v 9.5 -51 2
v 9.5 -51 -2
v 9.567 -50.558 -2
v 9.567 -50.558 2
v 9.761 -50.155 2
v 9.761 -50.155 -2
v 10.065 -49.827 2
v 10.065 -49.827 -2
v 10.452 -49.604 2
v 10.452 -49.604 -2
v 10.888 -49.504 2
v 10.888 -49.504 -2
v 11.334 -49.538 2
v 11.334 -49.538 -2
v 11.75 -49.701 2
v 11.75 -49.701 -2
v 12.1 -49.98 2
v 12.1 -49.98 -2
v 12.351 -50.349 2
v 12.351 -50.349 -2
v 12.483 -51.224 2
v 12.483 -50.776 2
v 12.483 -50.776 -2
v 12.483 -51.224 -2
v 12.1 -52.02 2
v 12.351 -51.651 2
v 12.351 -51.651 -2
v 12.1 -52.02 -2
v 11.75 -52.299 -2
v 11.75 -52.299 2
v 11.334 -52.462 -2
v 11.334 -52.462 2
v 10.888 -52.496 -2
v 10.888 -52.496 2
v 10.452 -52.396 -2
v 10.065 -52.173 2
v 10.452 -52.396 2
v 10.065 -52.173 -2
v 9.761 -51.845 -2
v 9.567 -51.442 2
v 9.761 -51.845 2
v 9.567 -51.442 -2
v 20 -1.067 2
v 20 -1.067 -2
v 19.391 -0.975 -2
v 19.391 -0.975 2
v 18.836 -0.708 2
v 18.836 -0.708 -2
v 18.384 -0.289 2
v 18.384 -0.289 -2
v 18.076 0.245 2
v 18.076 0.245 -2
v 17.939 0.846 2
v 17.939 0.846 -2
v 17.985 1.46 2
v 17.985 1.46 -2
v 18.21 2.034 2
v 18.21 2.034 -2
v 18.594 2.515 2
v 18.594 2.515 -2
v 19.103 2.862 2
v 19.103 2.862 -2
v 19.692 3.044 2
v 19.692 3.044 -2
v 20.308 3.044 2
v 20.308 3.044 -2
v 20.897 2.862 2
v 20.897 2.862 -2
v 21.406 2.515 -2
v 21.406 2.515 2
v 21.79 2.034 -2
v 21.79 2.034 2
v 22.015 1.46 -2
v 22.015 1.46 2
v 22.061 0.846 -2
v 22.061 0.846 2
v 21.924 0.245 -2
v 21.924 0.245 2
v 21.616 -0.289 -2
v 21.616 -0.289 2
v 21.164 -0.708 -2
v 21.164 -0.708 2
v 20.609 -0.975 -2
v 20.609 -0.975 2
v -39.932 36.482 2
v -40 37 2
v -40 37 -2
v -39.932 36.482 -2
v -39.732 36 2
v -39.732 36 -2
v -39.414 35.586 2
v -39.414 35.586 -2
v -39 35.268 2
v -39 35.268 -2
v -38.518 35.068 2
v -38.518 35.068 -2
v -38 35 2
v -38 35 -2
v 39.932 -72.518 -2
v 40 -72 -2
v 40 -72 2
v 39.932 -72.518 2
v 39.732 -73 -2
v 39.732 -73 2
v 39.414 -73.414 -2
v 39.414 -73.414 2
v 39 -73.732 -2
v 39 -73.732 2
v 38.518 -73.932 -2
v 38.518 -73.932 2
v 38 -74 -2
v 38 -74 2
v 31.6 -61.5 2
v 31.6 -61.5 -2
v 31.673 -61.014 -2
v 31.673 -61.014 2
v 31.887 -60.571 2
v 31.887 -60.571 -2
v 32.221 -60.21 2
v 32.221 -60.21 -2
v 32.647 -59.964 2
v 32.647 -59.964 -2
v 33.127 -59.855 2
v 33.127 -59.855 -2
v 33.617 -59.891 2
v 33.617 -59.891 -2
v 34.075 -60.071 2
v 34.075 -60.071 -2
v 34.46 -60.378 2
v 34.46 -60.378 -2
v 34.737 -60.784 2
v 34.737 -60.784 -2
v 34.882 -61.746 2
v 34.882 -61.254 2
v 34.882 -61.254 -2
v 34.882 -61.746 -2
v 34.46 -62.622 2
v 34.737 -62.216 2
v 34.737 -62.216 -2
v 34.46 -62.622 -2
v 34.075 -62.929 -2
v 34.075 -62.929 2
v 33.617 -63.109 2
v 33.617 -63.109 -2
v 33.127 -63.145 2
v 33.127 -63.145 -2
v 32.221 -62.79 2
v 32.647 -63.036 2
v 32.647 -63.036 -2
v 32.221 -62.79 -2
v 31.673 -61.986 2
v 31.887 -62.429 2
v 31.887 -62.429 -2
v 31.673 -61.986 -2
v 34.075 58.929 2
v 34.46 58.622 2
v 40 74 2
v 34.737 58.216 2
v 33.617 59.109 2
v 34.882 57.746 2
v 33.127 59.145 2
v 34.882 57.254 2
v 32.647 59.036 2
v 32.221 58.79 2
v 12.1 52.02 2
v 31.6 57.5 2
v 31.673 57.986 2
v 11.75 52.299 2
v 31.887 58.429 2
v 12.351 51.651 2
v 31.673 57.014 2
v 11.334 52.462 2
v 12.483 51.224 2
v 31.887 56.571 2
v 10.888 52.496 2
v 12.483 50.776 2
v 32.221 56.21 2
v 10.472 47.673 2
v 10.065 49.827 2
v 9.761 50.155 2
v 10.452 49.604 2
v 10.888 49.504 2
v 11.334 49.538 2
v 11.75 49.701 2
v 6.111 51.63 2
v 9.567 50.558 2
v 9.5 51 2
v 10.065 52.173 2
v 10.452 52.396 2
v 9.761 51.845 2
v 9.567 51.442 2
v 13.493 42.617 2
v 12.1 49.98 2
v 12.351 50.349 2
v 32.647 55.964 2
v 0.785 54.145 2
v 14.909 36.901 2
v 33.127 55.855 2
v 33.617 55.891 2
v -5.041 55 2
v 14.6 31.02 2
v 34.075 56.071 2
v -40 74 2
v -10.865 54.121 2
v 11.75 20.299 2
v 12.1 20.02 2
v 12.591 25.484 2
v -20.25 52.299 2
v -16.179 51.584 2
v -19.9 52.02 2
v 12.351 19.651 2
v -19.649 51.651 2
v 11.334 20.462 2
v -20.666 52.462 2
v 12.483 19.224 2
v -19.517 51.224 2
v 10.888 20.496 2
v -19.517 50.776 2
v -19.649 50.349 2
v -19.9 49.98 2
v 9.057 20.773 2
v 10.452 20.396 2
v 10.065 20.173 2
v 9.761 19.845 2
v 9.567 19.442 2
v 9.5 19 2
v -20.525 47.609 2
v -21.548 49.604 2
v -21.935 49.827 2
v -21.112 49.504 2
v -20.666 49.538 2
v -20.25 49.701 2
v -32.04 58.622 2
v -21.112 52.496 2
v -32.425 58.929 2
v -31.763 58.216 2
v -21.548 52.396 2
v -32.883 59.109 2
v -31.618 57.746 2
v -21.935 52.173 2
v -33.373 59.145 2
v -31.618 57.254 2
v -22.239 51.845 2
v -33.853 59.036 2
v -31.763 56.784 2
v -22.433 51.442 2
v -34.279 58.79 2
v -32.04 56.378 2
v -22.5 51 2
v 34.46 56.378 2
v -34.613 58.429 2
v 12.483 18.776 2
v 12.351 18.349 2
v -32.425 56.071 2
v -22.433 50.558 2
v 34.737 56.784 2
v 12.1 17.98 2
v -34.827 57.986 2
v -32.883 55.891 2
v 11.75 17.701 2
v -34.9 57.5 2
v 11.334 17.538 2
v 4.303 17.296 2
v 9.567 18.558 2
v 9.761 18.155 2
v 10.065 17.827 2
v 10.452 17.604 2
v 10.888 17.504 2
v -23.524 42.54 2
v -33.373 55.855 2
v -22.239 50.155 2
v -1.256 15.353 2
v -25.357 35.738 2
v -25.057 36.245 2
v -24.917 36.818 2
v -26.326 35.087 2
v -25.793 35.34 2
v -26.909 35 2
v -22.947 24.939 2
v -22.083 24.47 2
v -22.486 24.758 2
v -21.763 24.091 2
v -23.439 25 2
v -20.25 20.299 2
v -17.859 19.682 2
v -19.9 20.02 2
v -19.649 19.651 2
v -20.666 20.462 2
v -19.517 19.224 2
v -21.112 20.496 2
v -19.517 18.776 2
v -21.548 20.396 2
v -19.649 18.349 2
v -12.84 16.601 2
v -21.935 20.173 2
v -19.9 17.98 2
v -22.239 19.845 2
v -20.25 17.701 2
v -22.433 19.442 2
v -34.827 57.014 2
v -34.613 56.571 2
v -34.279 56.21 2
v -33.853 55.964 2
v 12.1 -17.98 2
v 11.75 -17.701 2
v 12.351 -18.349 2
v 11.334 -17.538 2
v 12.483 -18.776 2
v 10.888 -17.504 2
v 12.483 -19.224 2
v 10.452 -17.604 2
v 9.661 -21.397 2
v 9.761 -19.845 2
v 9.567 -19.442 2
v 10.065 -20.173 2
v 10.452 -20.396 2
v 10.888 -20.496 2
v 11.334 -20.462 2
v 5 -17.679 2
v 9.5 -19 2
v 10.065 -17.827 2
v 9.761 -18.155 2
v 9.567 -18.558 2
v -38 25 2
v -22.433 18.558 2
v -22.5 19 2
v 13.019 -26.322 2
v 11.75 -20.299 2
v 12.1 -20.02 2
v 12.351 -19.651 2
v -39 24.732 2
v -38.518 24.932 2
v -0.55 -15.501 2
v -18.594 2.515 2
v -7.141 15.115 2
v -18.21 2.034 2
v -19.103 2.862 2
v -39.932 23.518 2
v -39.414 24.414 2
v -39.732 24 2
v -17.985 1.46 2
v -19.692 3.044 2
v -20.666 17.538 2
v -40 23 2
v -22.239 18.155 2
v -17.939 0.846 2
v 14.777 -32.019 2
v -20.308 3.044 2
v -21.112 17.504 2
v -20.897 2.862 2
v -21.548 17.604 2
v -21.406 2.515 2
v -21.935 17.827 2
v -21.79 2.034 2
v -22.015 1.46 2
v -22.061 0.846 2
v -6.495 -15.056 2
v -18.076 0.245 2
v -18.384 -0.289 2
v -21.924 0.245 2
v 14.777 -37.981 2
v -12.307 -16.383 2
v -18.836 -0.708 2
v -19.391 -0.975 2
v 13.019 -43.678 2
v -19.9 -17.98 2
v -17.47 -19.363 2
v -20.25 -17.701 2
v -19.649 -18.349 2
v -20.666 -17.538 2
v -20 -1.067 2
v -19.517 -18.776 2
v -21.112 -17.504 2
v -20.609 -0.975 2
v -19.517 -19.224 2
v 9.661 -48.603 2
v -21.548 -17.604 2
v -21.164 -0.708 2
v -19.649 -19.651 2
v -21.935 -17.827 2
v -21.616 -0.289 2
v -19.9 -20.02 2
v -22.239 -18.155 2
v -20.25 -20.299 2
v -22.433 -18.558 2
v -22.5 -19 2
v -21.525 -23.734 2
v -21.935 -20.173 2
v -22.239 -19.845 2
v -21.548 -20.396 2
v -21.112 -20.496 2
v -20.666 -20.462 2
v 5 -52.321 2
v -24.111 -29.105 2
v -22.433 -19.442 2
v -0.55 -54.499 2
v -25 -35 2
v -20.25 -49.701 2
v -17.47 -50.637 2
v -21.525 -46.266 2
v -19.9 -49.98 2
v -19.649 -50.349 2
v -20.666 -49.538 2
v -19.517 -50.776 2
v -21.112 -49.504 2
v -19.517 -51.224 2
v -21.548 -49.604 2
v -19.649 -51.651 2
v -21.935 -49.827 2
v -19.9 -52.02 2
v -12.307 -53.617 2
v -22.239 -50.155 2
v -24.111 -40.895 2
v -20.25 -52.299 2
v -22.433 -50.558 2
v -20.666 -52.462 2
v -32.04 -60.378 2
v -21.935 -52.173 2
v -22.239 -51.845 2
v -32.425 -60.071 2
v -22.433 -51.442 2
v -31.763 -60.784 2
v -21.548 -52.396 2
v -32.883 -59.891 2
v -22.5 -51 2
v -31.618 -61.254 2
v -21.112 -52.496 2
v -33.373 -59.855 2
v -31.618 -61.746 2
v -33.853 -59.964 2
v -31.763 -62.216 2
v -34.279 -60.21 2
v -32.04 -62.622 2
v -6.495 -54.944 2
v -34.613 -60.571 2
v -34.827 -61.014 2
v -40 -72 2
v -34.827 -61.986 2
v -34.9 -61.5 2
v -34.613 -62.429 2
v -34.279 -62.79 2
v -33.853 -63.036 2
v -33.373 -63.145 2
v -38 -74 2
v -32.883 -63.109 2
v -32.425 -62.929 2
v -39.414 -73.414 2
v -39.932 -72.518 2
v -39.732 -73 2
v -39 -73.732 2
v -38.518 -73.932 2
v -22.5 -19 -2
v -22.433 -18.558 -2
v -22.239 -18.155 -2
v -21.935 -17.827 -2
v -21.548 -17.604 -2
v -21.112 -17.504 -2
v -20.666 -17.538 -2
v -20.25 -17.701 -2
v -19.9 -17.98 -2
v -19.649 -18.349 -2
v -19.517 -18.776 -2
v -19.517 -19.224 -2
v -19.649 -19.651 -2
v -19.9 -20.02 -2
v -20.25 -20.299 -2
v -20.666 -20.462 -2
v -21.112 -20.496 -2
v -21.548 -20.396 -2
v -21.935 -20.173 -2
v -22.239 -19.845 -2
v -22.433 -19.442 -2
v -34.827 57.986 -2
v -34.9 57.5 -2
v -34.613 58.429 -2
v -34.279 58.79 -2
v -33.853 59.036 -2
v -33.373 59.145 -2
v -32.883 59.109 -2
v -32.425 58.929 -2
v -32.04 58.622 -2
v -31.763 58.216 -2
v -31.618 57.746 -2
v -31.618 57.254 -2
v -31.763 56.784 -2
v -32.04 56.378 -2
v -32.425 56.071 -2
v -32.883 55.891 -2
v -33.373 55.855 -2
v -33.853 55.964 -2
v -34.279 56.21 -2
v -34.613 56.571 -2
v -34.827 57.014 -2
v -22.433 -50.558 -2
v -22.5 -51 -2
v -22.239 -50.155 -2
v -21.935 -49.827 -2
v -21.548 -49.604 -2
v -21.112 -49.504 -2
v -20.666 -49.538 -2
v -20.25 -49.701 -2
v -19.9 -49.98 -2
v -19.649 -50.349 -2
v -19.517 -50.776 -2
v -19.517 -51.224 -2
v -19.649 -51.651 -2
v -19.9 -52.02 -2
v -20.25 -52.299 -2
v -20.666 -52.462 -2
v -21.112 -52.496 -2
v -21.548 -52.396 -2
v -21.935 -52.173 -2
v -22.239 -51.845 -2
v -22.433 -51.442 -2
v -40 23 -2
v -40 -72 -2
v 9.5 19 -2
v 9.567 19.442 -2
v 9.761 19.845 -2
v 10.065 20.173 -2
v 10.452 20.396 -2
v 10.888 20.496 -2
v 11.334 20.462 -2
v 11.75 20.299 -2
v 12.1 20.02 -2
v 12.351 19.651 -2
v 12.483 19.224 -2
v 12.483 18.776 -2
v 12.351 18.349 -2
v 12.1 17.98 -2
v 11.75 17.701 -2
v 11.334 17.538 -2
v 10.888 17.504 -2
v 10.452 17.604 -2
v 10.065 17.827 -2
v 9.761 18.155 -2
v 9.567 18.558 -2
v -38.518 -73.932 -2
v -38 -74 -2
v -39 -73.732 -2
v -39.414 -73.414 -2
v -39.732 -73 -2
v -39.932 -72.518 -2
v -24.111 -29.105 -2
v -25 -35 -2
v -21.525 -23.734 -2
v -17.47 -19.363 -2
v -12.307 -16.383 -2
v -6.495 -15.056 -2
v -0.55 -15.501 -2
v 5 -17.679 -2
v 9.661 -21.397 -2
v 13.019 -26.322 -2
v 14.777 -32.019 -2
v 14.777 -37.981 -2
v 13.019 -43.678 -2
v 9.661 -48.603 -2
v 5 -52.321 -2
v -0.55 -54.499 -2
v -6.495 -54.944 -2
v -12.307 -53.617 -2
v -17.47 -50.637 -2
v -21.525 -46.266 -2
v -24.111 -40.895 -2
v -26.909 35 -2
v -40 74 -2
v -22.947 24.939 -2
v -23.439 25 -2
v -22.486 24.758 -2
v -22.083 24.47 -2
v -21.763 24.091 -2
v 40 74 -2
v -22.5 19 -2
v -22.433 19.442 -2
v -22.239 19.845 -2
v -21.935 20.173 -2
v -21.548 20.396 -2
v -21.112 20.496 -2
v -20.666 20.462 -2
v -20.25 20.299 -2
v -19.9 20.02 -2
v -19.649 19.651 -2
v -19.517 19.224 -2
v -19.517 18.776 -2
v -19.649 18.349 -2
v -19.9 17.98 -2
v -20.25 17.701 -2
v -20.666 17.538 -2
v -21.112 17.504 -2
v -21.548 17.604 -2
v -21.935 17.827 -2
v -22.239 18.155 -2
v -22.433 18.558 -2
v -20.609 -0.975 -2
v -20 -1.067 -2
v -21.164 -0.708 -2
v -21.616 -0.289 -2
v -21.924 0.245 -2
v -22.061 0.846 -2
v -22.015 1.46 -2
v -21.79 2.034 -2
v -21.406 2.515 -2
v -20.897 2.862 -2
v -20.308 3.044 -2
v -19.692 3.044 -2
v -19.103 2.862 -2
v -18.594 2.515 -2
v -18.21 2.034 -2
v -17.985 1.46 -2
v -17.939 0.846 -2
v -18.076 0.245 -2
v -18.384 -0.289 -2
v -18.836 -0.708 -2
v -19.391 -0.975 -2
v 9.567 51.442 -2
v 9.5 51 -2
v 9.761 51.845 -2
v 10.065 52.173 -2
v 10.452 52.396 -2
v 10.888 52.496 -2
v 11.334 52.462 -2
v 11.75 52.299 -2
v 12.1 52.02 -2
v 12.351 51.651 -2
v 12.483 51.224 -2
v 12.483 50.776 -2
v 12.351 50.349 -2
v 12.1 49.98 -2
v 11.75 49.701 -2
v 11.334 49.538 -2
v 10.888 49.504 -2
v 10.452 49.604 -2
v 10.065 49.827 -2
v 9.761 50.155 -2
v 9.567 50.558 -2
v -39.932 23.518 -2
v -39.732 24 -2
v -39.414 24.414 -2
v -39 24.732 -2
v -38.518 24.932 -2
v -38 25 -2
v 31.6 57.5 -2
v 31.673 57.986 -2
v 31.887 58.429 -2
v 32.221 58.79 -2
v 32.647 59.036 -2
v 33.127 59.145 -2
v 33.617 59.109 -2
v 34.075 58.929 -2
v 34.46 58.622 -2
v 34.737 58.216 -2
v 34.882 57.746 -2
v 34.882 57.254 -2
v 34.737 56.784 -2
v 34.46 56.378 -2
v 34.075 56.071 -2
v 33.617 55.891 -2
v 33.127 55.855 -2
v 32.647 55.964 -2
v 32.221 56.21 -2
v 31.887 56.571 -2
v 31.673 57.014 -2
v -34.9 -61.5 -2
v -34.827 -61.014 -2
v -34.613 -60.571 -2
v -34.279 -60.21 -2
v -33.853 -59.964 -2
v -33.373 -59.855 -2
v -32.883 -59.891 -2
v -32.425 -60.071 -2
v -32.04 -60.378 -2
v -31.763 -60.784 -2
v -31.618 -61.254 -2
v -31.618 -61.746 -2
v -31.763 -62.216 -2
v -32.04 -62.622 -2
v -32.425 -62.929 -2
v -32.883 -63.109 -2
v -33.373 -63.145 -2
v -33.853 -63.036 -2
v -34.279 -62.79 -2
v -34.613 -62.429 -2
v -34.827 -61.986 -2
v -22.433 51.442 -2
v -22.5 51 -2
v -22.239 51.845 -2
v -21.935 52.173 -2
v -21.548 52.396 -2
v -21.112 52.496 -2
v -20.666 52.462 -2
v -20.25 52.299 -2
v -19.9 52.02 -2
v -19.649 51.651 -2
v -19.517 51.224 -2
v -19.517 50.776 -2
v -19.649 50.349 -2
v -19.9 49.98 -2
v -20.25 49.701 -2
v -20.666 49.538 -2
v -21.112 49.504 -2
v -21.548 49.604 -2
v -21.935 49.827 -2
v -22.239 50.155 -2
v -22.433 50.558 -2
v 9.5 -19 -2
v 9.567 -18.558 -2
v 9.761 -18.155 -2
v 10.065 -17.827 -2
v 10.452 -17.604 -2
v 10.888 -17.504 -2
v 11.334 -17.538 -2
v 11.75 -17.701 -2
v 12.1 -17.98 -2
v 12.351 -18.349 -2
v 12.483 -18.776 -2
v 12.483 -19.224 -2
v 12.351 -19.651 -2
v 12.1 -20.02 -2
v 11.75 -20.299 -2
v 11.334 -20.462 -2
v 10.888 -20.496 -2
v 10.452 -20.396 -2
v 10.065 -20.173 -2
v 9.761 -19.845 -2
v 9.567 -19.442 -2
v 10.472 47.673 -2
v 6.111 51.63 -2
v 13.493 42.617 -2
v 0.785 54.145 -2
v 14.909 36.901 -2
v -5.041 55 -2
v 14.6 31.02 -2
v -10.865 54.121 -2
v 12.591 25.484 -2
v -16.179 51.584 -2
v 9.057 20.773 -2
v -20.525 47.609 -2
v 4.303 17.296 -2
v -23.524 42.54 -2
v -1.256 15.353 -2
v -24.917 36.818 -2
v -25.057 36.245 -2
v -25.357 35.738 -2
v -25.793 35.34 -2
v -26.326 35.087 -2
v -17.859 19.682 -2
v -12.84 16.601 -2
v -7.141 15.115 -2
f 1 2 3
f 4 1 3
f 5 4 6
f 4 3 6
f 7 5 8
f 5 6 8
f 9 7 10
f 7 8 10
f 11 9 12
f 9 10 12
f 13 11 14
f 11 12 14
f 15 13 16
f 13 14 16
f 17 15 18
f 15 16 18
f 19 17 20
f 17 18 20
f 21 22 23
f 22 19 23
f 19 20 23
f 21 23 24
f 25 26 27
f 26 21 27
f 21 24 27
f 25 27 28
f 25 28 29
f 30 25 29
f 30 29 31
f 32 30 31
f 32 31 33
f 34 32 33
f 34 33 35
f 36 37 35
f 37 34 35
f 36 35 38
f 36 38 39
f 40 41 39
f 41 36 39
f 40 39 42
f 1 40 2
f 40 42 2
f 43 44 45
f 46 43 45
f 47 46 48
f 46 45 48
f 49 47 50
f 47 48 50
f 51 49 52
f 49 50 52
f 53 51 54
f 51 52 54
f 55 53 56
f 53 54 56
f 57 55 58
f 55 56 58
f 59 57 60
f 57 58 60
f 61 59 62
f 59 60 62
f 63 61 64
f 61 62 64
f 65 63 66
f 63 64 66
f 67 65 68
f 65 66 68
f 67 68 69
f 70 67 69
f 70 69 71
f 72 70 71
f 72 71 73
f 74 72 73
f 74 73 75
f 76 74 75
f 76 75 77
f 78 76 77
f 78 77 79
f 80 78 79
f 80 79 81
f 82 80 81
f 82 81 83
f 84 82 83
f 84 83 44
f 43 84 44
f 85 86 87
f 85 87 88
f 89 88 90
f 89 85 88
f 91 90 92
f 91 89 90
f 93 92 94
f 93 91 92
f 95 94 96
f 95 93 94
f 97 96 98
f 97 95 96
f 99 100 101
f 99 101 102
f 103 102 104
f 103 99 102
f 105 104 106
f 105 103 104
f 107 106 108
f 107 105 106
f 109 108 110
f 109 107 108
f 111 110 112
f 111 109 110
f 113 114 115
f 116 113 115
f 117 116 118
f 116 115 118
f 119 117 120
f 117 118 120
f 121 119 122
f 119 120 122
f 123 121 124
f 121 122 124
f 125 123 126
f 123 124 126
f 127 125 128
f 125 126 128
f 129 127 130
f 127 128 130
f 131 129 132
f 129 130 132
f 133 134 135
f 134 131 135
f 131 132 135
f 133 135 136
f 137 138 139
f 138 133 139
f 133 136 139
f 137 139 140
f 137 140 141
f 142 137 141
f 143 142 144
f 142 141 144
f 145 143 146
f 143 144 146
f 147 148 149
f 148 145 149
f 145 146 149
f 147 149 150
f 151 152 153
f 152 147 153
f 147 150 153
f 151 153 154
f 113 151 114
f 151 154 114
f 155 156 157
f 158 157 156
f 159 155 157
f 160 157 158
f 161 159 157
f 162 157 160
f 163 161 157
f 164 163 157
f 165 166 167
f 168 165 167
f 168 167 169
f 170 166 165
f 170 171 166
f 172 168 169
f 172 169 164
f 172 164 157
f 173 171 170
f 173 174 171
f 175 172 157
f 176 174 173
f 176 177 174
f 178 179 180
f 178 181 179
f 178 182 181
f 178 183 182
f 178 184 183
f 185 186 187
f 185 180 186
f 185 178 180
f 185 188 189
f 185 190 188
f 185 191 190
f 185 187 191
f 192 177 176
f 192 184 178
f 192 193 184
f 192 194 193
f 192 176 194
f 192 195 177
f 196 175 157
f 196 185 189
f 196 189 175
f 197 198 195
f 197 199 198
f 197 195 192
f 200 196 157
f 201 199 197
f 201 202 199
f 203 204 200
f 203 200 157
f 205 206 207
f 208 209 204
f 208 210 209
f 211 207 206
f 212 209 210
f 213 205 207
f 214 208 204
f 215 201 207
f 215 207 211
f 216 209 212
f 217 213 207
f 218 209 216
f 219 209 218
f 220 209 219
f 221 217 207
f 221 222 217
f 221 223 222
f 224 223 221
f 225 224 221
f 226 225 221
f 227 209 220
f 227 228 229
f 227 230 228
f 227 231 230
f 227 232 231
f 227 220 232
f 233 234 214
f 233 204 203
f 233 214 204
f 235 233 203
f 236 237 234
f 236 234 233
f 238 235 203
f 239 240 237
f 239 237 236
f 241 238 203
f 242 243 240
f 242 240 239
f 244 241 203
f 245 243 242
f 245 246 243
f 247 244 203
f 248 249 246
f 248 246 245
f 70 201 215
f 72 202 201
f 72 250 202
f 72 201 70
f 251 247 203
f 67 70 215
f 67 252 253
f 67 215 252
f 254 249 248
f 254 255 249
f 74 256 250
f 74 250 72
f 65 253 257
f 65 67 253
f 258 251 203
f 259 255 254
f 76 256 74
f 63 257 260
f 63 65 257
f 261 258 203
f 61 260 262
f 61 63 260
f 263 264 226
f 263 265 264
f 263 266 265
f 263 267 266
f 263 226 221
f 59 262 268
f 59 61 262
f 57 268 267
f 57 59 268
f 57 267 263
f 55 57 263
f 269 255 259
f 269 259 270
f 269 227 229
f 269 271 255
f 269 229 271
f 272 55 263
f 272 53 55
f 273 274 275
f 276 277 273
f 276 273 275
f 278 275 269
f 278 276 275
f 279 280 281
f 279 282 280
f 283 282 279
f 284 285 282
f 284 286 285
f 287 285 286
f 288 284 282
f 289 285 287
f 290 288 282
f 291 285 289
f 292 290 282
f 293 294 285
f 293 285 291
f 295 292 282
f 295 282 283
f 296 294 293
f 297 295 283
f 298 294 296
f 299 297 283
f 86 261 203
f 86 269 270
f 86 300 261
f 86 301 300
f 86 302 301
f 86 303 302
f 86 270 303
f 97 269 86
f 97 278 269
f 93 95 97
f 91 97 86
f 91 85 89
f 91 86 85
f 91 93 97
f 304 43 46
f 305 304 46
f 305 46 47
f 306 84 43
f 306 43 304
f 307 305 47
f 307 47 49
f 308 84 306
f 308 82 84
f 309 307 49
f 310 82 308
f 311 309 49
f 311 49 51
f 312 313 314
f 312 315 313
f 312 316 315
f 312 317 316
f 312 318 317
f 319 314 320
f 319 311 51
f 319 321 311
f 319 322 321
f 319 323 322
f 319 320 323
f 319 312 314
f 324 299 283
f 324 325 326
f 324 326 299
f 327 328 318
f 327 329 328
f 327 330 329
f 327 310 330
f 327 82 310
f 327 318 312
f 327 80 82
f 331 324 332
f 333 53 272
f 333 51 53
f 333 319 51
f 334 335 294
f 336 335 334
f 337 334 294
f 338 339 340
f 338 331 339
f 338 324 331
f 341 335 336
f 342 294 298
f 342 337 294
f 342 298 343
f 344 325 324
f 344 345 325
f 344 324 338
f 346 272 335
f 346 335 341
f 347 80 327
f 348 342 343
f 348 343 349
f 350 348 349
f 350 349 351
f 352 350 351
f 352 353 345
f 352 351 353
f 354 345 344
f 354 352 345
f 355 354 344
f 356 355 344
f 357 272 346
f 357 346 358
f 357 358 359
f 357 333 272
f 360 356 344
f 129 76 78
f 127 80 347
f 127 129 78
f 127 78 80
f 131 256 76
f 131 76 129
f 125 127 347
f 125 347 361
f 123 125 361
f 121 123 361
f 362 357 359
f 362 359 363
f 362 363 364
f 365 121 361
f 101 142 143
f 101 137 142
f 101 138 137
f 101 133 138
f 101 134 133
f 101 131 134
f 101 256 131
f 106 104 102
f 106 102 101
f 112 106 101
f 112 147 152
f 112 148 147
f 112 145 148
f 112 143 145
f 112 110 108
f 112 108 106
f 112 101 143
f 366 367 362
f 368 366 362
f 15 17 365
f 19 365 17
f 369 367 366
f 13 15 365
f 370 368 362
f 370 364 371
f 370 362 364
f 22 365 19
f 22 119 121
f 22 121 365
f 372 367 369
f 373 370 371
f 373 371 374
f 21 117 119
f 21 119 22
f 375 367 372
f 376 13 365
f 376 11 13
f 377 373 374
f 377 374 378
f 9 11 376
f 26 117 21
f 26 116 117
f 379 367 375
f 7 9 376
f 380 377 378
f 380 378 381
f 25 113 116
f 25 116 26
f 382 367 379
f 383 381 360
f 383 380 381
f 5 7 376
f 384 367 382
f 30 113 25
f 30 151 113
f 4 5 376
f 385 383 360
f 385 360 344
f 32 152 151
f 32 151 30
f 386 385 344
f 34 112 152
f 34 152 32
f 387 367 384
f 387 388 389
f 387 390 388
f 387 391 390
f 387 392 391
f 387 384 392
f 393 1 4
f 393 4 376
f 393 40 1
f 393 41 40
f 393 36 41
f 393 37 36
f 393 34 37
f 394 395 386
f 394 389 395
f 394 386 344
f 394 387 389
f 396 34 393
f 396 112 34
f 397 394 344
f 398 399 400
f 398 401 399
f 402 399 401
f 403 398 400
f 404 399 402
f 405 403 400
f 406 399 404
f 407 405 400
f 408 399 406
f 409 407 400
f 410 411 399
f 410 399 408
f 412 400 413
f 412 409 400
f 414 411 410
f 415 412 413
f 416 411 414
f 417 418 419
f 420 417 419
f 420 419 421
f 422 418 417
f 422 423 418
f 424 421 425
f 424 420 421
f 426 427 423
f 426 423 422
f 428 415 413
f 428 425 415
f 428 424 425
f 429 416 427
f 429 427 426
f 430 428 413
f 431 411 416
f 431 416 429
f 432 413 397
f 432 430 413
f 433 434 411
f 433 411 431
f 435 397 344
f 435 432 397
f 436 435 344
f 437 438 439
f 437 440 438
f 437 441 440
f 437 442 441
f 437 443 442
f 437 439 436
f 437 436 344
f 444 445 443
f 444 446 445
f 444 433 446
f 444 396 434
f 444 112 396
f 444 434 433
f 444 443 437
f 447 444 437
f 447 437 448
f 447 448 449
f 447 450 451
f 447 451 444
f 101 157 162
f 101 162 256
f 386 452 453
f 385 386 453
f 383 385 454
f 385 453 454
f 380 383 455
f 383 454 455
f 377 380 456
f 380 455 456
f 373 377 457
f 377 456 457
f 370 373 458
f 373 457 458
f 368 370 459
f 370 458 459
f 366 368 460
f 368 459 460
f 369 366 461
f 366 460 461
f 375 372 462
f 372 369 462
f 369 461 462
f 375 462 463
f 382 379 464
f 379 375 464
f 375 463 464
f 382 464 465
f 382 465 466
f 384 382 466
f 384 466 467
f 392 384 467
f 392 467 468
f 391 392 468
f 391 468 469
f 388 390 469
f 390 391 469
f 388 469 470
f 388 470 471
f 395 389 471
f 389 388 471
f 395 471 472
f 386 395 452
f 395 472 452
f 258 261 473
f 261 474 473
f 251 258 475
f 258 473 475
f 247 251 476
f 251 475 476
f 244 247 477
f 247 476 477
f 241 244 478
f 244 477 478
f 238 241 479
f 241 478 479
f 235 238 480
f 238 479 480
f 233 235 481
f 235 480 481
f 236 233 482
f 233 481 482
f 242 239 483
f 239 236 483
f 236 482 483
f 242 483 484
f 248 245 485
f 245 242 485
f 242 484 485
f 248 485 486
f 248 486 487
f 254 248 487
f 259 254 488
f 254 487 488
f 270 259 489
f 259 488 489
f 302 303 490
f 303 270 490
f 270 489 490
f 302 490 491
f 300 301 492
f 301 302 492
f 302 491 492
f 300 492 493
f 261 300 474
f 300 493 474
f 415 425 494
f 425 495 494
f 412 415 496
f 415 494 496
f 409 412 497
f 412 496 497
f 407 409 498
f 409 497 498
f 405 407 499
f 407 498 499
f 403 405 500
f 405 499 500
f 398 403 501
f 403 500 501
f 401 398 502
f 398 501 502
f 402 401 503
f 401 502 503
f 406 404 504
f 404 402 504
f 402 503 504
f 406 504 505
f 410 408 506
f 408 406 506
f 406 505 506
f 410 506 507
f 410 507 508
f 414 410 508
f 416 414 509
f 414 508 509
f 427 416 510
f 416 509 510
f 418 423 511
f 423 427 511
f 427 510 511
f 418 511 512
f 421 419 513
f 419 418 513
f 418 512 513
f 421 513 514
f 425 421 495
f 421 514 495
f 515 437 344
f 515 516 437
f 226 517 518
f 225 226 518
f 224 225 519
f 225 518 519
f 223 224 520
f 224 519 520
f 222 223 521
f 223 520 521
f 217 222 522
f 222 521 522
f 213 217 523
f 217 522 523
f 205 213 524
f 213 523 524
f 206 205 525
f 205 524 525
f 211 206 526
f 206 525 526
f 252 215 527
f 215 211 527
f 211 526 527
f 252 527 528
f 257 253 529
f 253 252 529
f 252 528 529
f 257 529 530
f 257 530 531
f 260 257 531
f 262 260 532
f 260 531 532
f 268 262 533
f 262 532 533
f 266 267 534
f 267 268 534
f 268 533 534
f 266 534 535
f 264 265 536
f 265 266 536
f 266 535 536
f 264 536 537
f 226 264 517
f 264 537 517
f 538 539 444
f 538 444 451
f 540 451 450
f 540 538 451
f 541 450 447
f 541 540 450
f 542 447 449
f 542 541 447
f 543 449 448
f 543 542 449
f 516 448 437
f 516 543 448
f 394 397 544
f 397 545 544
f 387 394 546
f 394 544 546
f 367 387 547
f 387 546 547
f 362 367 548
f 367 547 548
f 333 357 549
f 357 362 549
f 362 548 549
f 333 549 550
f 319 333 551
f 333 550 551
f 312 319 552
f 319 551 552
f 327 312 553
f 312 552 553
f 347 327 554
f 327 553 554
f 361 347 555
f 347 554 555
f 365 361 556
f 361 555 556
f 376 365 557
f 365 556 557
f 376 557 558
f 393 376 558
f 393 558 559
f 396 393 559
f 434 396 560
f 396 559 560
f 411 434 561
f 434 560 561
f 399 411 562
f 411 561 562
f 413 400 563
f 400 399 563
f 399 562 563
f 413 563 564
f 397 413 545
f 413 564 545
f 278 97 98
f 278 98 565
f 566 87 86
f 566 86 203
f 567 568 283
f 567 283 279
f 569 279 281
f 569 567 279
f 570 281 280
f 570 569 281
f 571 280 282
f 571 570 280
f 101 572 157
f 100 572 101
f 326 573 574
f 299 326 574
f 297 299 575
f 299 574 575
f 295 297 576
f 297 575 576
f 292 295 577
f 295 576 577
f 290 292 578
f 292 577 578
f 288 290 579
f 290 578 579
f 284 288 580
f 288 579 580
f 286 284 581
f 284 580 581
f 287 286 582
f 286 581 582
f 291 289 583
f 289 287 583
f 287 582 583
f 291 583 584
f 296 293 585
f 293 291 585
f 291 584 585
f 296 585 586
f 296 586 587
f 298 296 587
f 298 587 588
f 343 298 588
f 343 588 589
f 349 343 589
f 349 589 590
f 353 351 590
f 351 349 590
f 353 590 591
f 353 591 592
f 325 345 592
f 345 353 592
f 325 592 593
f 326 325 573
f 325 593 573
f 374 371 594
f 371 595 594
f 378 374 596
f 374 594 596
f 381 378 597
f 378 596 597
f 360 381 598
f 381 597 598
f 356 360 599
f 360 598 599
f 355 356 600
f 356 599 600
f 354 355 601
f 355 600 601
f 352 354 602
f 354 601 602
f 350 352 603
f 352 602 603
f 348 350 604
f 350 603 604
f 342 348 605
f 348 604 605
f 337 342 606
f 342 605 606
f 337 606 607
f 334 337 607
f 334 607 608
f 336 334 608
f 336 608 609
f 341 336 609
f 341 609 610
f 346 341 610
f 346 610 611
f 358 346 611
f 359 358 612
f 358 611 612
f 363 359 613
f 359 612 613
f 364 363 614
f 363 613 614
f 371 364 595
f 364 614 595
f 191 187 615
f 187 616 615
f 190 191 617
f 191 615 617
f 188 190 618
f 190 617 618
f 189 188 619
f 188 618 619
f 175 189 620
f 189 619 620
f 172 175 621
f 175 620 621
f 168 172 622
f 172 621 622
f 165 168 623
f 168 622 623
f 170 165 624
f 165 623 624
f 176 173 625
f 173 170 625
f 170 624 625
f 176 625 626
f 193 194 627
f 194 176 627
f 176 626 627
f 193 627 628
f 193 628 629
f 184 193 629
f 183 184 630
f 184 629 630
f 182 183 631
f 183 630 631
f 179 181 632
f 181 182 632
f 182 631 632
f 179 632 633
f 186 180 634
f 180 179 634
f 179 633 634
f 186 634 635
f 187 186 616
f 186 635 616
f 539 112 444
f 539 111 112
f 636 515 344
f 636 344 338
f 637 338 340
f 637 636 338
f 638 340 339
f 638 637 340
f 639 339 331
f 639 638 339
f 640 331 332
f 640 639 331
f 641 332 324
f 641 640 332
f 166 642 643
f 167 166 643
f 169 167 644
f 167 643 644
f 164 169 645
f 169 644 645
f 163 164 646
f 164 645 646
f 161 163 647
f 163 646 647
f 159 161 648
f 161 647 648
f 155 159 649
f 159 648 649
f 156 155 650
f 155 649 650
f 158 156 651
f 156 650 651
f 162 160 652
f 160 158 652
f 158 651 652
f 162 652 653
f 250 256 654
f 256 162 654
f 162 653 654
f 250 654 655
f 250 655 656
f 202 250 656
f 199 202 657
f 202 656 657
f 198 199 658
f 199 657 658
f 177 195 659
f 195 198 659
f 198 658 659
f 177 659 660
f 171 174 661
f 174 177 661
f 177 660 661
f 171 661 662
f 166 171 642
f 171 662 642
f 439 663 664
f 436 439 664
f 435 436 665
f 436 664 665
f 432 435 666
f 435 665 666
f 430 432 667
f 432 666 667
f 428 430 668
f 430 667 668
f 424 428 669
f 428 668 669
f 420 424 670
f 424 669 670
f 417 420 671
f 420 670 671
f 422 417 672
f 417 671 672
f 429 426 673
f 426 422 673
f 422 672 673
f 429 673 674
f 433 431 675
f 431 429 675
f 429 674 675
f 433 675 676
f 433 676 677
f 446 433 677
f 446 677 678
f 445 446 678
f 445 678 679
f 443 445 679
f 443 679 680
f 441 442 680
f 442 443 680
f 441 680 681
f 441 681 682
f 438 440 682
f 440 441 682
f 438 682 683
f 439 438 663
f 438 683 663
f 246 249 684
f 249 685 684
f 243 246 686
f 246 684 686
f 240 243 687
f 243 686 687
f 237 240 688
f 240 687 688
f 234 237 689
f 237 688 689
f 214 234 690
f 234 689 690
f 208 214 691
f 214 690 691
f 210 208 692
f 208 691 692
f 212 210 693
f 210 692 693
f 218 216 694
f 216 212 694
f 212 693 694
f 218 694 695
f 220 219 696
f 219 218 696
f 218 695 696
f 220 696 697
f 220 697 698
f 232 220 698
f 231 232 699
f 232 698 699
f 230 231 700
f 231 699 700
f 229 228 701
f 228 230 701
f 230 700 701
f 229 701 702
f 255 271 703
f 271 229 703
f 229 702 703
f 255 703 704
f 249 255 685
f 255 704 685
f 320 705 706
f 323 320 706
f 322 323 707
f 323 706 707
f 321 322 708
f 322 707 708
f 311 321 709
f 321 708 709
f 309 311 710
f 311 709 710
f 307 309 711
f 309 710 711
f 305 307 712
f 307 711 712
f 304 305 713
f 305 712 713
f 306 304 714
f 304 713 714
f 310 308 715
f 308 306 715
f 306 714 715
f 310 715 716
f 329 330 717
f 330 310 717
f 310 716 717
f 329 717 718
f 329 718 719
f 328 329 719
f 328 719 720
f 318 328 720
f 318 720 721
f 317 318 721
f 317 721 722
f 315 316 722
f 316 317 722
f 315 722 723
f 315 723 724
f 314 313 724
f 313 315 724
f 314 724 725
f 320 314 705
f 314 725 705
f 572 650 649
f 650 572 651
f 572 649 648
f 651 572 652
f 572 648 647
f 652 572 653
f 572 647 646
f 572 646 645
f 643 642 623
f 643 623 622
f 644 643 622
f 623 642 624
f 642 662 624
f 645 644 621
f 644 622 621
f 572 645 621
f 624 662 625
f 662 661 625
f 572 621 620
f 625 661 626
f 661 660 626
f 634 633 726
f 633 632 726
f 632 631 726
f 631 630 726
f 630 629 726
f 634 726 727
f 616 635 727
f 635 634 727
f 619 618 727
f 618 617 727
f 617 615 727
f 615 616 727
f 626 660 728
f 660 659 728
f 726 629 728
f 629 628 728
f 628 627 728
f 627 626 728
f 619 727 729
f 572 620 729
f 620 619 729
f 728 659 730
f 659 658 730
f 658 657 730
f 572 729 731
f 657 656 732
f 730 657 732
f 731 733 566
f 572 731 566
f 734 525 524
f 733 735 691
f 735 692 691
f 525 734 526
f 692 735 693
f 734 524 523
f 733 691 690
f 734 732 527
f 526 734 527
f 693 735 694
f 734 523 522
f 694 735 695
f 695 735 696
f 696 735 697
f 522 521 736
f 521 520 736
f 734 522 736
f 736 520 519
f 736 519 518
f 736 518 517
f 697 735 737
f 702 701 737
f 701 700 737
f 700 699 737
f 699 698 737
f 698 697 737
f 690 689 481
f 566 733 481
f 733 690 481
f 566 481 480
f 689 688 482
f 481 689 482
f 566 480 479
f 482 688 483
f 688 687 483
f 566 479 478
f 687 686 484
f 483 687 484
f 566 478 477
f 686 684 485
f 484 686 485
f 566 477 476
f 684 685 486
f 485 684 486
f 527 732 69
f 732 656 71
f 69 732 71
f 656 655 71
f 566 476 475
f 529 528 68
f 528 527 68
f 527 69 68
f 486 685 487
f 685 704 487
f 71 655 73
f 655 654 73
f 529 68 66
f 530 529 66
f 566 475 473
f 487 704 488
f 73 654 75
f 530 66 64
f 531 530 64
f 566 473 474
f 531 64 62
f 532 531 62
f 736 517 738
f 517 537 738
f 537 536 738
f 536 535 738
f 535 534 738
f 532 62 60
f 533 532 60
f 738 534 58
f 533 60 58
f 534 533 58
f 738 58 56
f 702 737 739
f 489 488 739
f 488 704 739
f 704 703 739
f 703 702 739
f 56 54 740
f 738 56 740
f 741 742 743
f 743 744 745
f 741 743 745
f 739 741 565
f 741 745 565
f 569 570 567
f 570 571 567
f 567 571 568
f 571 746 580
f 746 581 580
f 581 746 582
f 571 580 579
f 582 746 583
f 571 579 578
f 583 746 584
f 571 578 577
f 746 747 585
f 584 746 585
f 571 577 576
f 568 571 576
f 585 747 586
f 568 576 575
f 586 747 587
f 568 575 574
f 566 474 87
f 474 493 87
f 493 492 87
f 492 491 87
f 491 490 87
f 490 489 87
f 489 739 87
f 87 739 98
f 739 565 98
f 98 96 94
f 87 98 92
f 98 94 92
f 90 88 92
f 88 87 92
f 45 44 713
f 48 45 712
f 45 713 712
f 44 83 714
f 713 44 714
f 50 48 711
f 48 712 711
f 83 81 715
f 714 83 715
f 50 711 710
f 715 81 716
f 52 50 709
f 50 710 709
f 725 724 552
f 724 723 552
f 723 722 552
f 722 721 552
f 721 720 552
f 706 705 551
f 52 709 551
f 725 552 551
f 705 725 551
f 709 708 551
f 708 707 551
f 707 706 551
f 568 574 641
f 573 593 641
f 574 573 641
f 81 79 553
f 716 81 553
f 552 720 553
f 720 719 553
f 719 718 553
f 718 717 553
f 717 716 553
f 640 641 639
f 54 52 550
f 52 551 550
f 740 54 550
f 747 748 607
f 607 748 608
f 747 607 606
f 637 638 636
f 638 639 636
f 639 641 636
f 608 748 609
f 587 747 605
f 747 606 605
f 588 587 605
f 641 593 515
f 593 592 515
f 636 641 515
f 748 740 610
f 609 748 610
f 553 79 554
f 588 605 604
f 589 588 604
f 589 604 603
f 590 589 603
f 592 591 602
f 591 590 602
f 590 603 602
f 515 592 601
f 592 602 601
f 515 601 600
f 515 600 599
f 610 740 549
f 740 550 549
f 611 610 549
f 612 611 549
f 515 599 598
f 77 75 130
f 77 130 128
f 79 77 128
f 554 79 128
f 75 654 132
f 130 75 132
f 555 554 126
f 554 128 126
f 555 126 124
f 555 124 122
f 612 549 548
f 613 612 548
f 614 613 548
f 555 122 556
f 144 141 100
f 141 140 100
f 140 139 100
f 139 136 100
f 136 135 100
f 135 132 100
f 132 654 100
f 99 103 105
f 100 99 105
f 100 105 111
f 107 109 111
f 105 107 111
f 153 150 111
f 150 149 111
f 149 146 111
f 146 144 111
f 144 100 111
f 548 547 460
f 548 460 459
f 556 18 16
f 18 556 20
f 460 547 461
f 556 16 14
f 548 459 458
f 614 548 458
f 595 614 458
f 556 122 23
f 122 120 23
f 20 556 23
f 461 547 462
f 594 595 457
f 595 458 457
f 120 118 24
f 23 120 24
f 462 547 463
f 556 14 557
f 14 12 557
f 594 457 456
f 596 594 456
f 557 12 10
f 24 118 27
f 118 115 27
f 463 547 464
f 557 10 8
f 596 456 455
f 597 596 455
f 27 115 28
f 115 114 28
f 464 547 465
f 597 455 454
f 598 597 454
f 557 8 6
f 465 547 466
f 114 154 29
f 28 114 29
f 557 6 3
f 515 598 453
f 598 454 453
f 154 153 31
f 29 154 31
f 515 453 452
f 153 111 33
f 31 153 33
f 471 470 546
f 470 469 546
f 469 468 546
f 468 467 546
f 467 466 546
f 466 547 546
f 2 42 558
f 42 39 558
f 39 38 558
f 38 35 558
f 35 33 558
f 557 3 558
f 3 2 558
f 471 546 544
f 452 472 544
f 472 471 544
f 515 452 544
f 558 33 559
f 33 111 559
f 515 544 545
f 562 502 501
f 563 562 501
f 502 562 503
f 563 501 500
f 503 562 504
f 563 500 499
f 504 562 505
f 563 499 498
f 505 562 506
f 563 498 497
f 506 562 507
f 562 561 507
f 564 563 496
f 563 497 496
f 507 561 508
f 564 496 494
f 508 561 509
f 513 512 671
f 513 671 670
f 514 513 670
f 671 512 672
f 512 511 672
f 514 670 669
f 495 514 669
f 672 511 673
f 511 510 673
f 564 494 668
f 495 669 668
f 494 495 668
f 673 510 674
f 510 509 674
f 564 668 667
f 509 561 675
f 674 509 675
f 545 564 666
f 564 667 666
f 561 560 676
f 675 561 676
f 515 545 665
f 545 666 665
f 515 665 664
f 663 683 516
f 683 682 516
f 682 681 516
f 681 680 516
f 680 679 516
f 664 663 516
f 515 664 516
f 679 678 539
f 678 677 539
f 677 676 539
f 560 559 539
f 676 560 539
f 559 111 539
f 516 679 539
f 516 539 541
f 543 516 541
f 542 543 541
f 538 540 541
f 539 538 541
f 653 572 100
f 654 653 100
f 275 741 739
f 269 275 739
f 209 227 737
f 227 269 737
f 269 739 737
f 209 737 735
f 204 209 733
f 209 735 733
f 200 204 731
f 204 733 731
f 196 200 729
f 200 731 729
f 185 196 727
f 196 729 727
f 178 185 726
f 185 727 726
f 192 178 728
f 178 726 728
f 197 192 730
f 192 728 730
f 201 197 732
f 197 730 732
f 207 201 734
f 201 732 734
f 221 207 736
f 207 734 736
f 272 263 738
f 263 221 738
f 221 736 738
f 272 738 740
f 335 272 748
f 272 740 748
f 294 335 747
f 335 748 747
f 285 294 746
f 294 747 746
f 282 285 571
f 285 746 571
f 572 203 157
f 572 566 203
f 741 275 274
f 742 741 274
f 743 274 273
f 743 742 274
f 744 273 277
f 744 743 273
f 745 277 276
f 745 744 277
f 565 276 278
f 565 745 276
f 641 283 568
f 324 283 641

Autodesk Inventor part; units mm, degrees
ref_plane "YZ Plane" through (0, 0, 0) normal (1, 0, 0) x (0, 1, 0)
ref_plane "XZ Plane" through (0, 0, 0) normal (0, 1, 0) x (-1, 0, 0)
ref_plane "XY Plane" through (0, 0, 0) normal (0, 0, 1) x (1, 0, 0)
sketch "Sketch1" plane through (0, 0, 0) normal (0, 0, 1) x (-1, 0, 0)
  line L0 (-38, 74) -> (38, 74)
  line L1 (40, 72) -> (40, -74)
  line L2 (40, -74) -> (-40, -74)
  line L3 (-40, -74) -> (-40, 72)
  circle A0 centre (-33.25, 61.5) radius 1.65
  circle A1 centre (33.25, 61.5) radius 1.65
  circle A2 centre (33.25, -57.5) radius 1.65
  circle A3 centre (-33.25, -57.5) radius 1.65
  line L4 (-33.25, 61.5) -> (33.25, 61.5) construction
  line L5 (33.25, 61.5) -> (33.25, -57.5) construction
  circle A4 centre (5, 35) radius 20
  circle A5 centre (5, -35) radius 20
  line L6 (5, 35) -> (5, -35) construction
  line L7 (-11, -51) -> (21, -51) construction
  line L8 (21, -51) -> (21, -19) construction
  line L9 (-11, 51) -> (21, 51) construction
  line L10 (21, 51) -> (21, 19) construction
  circle A6 centre (-11, 51) radius 1.5
  circle A7 centre (21, 51) radius 1.5
  circle A8 centre (21, 19) radius 1.5
  circle A9 centre (-11, 19) radius 1.5
  circle A10 centre (21, -19) radius 1.5
  circle A11 centre (21, -51) radius 1.5
  circle A12 centre (-11, -51) radius 1.5
  circle A13 centre (-11, -19) radius 1.5
  arc A14 (-38, 74) -> (-40, 72) centre (-38, 72) ccw
  arc A15 (40, 72) -> (38, 74) centre (38, 72) ccw
  point P0 (0, 0)
  point P1 (-40, 74)
  point P2 (40, 74)
  point P3 (0, 74)
  point P4 (-40, 0)
  point P5 (0, 61.5)
  point P6 (5, 0)
  point P7 (21, 35)
  point P8 (5, 51)
  point P9 (5, -51)
  point P10 (21, -35)
  dimension "d15" = 2
  dimension "d0" = 80
  dimension "d1" = 148
  dimension "d2" = 3.3
  dimension "d3" = 119
  dimension "d4" = 66.5
  dimension "d20" = 40
  dimension "d21" = 40
  dimension "d22" = 70
  dimension "d23" = 32
  dimension "d24" = 3
  dimension "d26" = 5
  dimension "d28" = 2
  dimension "d29" = 16.5
  dimension "d30" = 74
extrude "soporte circuito KAEN" add sketch "Sketch1" along normal mid plane 4
sketch "Sketch2" plane through (0, 0, 2) normal (0, 0, 1) x (-1, 0, 0)
  line L0 (-20, -1) -> (20, -1) construction
  line L1 (40, -74) -> (40, 72) construction
  line L2 (-40, -74) -> (40, -74) projected
  point P0 (0, 0)
  point P1 (36.5, 73)
  point P2 (0, -1)
  point P3 (36.5, -74)
  point P4 (-36.5, -74)
  point P5 (34.5, -75)
  point P6 (40, 72)
  dimension "d11" = 40
  dimension "d25" = 73
hole "M5" at (20, 1, 2) at (-20, 1, 2) direction (0, 0, -1) diameter 4.134 end through all thread size "M5x0.8" class "6H" standard "ANSI Metric M Profile"
sketch "Sketch3" plane through (0, 0, 2) normal (0, 0, 1) x (1, 0, 0)
  line L0 (-41, 35) -> (-22, 35)
  line L1 (-22, 35) -> (-22, 25)
  line L2 (-22, 25) -> (-41, 25)
  line L3 (-41, 25) -> (-41, 35)
  circle A0 centre (-5, 35) radius 20 projected
  point P0 (0, 0)
  point P1 (-31.5, 35)
  point P2 (-22.3205, 25)
  point P3 (-25, 35)
  dimension "d31" = 10
  dimension "d32" = 19
  dimension "d33" = 17
extrude "Extrusion2" cut sketch "Sketch3" against normal through all contours L0 A0 L2 L3
fillet "Fillet2" radius 2 4 edges at (-40, 35, 0) (-40, 25, 0) (-25, 35, 0) (-22.3205, 25, 0)
properties part number "Placa soporte TIC DC" material "Polycarbonate, Smoke"
